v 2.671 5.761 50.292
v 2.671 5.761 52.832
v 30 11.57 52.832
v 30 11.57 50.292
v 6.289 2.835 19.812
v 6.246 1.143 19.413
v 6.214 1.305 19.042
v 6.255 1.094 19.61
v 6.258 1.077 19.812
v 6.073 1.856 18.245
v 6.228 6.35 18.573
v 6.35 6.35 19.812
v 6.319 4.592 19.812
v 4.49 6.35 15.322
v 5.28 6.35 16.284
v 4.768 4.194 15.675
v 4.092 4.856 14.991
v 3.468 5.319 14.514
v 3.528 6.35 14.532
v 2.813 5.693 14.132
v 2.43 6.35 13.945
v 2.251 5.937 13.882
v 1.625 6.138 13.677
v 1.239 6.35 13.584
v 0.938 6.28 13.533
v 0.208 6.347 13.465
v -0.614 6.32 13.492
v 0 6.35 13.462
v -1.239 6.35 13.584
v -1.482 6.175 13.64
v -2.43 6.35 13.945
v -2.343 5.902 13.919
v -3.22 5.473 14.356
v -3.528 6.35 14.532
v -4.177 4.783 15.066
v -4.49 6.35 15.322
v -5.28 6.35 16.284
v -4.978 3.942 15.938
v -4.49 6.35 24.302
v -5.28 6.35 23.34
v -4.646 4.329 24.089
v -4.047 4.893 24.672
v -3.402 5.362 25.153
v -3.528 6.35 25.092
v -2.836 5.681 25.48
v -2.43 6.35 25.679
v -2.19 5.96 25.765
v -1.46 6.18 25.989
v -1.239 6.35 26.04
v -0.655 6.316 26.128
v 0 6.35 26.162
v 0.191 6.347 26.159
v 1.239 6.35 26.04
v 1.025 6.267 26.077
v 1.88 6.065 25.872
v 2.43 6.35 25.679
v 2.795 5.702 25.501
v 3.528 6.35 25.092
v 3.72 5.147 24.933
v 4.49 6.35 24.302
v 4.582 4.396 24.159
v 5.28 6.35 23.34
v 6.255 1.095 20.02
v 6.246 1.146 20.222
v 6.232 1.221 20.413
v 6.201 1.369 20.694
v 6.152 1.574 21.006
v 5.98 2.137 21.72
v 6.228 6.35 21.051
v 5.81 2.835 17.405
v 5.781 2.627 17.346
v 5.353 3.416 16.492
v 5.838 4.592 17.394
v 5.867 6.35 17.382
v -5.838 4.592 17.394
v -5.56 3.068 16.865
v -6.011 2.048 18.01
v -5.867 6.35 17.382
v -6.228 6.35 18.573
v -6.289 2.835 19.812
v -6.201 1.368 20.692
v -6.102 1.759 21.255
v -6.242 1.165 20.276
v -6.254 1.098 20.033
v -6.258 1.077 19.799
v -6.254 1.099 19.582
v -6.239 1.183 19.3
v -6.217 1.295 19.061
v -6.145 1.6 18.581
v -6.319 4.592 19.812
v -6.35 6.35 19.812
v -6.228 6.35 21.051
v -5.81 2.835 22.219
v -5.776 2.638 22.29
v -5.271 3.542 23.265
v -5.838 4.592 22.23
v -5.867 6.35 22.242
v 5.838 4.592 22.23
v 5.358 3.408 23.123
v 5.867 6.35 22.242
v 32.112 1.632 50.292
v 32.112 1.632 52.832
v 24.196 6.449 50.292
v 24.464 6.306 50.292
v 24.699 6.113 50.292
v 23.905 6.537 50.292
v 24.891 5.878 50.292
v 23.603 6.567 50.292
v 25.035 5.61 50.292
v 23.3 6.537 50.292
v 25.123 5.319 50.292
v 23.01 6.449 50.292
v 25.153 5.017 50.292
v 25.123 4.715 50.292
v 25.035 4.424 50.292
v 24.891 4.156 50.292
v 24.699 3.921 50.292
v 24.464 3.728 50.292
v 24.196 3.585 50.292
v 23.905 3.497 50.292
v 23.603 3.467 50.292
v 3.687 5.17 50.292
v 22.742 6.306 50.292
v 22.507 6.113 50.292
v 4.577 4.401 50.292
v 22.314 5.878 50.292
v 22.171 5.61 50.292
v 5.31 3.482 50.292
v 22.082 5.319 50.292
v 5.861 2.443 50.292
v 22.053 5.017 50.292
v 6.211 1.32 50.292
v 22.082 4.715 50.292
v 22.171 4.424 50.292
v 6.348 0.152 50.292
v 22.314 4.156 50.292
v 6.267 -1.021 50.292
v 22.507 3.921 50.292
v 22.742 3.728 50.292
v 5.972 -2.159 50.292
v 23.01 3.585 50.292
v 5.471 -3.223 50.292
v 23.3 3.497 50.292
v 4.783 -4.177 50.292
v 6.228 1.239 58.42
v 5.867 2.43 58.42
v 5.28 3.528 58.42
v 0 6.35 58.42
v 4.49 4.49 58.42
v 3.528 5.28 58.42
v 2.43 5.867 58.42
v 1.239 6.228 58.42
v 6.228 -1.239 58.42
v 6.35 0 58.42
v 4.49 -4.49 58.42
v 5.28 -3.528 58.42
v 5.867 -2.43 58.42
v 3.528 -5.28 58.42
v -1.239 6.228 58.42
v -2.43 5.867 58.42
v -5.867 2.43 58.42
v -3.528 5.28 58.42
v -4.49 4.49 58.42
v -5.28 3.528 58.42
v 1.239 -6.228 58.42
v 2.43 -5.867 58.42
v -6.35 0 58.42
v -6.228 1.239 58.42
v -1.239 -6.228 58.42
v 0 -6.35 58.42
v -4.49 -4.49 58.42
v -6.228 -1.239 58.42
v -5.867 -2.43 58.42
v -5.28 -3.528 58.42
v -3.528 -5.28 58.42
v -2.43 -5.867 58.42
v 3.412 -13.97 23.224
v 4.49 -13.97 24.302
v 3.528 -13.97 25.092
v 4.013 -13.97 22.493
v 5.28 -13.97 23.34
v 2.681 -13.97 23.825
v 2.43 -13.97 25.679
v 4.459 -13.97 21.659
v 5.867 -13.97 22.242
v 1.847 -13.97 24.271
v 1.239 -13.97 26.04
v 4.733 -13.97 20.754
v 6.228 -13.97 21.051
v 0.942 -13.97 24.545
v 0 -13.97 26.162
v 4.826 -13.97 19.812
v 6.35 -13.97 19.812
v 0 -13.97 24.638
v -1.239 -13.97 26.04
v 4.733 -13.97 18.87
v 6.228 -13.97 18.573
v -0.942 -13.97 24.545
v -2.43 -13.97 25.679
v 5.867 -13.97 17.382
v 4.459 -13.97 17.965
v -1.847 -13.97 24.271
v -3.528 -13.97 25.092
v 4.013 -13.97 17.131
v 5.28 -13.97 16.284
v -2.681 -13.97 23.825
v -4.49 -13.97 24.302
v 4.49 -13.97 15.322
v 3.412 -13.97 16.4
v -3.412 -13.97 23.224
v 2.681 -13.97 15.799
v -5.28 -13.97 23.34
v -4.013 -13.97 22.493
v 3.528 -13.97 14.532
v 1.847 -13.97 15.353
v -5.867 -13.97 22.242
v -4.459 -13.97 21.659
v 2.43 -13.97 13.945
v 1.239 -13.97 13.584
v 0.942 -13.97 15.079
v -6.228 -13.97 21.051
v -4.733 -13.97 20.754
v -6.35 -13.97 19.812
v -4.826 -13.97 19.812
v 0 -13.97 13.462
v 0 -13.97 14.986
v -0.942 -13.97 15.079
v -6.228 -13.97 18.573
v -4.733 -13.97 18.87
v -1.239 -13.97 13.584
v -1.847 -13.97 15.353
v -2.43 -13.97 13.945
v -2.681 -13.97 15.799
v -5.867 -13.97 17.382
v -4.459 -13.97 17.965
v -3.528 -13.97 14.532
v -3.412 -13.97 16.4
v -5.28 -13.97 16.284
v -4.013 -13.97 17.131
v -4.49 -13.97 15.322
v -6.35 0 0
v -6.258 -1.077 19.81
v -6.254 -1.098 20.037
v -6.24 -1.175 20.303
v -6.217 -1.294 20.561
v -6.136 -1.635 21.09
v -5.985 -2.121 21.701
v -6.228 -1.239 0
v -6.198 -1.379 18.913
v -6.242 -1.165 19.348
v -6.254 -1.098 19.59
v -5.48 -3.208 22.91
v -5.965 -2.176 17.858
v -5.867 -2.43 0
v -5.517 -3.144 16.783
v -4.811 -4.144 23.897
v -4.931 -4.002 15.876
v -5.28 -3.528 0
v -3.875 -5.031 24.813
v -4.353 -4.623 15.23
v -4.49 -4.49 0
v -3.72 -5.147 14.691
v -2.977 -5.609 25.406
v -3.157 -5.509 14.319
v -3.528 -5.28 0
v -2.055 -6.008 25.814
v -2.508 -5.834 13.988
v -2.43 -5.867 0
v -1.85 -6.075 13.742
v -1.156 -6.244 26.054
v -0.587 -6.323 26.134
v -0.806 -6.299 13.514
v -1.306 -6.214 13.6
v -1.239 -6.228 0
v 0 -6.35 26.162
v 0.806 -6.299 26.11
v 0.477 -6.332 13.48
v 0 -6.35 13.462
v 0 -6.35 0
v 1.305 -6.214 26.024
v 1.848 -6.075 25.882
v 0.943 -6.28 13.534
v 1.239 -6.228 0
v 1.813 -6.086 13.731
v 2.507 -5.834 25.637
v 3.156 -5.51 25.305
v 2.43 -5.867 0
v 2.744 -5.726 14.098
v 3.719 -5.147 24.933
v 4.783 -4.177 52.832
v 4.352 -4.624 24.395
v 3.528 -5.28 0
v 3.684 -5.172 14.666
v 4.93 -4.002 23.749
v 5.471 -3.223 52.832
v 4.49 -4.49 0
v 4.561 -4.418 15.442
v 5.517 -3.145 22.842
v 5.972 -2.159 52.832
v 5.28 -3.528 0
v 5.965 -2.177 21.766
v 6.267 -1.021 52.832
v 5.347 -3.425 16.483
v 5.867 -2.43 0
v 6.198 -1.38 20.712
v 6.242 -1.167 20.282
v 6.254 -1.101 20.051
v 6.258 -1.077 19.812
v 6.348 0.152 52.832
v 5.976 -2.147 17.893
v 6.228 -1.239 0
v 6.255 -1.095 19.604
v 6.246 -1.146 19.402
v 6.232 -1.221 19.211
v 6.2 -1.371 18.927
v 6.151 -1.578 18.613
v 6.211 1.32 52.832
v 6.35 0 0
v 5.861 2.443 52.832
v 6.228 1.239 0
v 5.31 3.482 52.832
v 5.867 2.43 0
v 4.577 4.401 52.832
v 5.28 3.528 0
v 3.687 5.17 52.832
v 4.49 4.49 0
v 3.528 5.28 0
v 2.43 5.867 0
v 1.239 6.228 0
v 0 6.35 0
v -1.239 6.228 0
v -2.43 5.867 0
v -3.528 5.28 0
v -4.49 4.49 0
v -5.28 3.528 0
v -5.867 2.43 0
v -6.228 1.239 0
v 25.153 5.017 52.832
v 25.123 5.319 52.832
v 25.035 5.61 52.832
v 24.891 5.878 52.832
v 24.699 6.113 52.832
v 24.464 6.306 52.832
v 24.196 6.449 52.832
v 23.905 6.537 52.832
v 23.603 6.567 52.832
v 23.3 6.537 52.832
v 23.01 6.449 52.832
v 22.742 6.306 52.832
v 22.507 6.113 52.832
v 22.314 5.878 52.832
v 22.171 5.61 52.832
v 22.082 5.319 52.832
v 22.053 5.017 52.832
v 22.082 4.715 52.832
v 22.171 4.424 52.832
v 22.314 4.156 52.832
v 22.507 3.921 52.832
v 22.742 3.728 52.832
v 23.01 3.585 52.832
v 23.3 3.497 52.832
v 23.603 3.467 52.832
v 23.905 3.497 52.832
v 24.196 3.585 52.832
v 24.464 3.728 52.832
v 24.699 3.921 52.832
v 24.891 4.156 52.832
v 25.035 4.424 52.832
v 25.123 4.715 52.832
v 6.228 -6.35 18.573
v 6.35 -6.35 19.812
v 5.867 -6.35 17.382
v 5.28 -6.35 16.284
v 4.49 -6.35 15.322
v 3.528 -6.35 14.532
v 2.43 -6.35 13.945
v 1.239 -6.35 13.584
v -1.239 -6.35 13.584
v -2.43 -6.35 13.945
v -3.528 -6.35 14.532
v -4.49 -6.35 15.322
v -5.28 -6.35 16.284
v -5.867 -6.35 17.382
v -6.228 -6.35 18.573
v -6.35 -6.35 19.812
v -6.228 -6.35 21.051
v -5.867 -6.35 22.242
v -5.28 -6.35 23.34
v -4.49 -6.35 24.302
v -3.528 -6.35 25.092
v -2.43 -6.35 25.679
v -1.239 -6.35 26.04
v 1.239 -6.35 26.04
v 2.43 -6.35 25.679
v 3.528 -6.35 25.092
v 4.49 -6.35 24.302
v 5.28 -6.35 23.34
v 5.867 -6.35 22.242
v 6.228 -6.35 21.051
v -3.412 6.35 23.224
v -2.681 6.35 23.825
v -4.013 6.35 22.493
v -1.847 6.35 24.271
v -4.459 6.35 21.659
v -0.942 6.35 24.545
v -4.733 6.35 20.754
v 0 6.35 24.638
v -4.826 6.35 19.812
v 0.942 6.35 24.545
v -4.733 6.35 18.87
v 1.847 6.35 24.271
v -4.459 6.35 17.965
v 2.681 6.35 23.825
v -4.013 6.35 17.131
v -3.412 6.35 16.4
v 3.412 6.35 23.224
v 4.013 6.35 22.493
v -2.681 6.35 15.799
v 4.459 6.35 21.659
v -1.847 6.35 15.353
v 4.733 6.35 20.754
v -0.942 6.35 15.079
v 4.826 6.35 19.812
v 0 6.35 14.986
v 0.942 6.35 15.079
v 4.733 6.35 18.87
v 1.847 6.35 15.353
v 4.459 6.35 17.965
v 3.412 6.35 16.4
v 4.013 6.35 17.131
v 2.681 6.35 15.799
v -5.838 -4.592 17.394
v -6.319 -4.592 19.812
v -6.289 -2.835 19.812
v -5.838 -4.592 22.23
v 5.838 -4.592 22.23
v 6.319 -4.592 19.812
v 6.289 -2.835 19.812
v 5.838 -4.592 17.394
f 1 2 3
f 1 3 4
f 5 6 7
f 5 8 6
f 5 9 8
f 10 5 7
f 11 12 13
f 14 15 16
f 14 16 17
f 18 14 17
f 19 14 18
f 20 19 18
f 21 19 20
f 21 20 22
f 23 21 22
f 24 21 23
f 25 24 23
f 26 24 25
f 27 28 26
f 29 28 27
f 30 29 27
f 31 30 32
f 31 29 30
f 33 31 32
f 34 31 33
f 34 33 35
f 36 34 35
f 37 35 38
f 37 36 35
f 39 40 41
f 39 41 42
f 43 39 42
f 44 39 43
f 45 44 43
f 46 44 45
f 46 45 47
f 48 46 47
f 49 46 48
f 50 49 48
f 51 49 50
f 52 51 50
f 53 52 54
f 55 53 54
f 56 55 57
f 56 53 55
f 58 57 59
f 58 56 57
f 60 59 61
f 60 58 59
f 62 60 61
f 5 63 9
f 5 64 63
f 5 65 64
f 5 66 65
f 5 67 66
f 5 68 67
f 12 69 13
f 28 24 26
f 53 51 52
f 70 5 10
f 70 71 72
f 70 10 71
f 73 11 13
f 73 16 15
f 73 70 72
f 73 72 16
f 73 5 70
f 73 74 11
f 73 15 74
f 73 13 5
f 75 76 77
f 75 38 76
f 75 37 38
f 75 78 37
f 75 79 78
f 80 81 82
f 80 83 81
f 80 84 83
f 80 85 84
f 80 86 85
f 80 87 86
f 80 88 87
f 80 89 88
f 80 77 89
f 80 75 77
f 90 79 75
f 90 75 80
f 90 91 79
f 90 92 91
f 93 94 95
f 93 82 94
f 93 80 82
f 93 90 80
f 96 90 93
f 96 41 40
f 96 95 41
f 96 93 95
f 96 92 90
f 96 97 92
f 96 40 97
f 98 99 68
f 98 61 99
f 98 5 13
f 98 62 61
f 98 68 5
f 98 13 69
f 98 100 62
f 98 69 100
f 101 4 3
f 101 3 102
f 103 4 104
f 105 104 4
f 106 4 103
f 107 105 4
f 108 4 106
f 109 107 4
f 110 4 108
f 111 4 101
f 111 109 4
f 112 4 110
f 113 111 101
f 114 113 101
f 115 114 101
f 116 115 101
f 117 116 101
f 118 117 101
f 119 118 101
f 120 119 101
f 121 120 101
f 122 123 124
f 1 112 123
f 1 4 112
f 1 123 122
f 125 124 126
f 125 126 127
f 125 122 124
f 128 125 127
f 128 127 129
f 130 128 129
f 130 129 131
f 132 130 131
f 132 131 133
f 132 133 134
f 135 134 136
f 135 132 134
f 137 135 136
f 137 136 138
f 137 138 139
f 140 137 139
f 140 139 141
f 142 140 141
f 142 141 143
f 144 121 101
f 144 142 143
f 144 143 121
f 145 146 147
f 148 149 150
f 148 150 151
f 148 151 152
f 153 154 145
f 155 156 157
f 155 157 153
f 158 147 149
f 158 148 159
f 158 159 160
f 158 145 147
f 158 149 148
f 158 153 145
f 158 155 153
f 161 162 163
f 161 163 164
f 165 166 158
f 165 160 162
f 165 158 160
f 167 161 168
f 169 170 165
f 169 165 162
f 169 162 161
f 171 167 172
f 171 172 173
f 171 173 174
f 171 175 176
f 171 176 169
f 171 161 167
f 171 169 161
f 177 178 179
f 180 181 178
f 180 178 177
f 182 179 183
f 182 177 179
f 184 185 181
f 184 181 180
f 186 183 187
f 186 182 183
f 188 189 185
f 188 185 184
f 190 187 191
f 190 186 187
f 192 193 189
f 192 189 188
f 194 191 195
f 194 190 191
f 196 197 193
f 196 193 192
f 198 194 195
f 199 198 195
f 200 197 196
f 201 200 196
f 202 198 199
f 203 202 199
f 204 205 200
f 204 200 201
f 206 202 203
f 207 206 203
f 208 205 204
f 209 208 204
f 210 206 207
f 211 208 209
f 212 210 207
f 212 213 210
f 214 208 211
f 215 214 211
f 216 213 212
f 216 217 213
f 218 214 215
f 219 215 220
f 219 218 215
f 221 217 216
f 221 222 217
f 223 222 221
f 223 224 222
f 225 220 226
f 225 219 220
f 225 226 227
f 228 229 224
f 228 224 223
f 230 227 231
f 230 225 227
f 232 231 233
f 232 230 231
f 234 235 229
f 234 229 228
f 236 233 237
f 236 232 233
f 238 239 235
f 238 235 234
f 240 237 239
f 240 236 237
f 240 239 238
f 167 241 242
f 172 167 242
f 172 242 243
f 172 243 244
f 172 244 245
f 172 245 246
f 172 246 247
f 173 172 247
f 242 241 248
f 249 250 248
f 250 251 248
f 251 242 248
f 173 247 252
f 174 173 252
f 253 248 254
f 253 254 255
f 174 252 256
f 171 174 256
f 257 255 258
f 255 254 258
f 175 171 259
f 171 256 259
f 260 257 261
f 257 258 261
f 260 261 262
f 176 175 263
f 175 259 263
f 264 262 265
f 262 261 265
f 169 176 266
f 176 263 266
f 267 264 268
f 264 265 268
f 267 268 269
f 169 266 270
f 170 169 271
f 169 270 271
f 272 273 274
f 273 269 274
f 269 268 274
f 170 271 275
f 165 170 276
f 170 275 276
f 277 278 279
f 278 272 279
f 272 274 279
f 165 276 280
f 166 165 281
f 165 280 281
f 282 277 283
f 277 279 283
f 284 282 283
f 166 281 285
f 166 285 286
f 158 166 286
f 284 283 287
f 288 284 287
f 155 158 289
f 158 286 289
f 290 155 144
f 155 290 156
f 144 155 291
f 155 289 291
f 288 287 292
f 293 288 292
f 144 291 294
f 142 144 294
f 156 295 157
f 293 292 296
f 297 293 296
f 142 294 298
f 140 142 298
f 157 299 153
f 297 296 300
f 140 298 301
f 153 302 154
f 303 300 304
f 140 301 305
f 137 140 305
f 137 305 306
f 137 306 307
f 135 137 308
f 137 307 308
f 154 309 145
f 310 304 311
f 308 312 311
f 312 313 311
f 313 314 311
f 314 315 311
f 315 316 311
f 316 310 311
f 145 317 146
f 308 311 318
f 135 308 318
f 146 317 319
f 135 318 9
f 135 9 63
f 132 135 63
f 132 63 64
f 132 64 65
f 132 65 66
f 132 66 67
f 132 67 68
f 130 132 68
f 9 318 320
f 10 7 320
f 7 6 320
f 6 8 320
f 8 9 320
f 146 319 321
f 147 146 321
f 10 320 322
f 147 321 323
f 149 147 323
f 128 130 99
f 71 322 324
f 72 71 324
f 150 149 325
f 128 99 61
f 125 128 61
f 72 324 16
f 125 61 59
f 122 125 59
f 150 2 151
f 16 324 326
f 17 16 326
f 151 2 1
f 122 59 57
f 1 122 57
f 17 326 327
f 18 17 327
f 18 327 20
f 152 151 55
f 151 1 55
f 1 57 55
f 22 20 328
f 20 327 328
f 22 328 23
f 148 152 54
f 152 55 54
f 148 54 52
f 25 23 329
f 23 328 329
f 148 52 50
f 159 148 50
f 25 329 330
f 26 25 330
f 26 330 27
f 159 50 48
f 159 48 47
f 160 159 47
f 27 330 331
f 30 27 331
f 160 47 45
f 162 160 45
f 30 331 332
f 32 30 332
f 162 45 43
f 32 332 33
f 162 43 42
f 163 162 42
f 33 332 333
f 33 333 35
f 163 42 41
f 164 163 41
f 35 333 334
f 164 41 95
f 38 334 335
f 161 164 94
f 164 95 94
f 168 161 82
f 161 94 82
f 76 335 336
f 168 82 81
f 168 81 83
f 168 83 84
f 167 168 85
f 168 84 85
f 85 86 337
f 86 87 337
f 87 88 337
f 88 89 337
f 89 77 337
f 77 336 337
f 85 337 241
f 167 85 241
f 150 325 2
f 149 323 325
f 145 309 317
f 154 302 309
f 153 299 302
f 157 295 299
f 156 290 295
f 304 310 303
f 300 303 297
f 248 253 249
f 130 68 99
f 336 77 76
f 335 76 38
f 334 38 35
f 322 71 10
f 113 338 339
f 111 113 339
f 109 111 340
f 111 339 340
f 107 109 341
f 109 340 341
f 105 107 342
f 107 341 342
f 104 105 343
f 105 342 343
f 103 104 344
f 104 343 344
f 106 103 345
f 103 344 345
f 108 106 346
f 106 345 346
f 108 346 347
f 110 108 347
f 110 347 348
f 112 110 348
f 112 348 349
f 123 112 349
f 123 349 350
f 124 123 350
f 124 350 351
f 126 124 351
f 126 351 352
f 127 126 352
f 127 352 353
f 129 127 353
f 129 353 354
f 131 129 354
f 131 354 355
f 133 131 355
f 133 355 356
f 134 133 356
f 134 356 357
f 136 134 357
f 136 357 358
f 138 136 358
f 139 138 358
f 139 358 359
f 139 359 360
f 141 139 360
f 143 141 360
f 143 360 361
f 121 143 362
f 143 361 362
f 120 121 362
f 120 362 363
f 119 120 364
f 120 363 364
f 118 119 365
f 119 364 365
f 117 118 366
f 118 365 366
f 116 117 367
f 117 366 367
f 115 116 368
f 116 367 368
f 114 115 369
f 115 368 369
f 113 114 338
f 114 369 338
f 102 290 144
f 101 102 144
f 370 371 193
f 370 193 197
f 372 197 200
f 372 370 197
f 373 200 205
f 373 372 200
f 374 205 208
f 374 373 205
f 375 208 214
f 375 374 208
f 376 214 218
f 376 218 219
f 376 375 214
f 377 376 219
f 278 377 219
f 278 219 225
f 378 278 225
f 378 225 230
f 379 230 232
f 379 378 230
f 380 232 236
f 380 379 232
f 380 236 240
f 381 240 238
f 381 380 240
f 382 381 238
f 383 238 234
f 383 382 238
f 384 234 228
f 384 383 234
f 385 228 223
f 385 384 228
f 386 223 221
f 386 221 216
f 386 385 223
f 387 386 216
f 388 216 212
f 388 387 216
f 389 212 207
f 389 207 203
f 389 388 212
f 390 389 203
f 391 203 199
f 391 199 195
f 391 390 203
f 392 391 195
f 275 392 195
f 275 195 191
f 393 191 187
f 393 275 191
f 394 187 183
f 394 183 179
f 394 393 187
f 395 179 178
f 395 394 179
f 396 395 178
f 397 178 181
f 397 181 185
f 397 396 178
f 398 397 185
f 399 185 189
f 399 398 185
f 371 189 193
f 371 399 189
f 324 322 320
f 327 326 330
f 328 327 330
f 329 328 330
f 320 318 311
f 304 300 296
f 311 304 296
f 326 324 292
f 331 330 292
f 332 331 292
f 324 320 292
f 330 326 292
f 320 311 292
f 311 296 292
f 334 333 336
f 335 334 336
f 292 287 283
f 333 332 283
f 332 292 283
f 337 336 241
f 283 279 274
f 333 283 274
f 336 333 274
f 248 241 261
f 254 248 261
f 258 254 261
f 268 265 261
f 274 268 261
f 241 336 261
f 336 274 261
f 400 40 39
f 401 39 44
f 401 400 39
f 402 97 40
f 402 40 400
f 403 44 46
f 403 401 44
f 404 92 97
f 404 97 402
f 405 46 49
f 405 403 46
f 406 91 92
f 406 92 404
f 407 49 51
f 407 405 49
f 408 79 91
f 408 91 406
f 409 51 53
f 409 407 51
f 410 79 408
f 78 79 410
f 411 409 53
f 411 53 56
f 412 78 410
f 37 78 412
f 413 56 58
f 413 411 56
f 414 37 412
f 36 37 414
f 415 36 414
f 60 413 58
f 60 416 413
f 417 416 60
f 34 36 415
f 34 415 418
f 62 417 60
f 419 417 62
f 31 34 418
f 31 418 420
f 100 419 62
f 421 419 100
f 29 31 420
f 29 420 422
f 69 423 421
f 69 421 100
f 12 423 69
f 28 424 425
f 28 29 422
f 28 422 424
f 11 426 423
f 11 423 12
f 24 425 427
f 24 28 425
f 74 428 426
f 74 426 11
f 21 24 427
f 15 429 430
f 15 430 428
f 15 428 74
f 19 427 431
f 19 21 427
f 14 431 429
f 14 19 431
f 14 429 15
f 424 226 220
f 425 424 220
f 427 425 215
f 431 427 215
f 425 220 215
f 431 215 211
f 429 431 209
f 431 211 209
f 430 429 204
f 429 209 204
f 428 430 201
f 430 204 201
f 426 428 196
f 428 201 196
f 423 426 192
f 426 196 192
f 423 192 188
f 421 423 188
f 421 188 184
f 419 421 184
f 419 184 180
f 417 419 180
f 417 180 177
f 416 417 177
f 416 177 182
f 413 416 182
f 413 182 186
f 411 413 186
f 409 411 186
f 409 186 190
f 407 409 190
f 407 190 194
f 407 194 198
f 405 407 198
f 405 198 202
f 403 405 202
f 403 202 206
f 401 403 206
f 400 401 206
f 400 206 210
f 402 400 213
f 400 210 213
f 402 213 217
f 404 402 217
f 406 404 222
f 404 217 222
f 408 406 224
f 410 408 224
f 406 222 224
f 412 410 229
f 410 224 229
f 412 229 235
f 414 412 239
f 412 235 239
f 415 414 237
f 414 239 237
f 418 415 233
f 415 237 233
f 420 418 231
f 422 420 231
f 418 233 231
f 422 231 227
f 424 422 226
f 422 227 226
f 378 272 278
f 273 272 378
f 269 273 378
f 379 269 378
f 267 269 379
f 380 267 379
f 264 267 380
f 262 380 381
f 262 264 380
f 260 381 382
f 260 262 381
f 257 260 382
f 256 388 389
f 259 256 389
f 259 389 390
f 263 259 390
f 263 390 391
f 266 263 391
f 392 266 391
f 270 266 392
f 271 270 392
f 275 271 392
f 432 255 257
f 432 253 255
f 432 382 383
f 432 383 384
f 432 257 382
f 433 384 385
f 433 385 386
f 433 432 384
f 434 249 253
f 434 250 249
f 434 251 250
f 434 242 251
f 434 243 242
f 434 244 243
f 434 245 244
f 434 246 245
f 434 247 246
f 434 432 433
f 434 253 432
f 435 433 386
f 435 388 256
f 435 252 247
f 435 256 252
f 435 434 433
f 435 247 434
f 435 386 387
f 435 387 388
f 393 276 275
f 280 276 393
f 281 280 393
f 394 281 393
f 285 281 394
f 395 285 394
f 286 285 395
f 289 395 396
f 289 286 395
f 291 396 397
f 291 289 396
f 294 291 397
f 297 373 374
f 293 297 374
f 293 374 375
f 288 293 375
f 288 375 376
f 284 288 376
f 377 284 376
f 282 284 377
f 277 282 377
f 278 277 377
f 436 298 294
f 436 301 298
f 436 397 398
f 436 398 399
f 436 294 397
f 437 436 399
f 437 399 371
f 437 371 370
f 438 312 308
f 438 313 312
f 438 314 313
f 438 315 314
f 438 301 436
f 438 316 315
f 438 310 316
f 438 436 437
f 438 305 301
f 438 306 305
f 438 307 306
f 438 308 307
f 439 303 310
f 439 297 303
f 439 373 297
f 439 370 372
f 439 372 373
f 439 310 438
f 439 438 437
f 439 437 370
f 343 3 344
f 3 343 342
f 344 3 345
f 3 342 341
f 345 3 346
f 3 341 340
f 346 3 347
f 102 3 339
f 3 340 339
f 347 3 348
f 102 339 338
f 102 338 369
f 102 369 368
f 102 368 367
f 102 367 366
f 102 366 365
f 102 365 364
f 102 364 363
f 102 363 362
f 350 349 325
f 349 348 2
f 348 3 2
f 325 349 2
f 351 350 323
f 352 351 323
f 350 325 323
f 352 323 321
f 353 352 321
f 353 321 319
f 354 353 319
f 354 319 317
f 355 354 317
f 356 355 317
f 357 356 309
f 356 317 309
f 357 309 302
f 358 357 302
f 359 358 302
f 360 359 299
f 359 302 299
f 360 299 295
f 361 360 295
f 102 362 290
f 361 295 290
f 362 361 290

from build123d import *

# Parameters (mm, degrees)
SKETCH1_R           = 6.35
BOSS_EXTRUDE1_DEPTH = 58.42
BOSS_EXTRUDE3_START = -2.54
SKETCH7_W           = 10.16
SKETCH7_H           = 2.54
BOSS_EXTRUDE3_DEPTH = 27.94
SKETCH10_R          = 1.55
CUT_EXTRUDE2_DEPTH  = 64.384429767
SKETCH13_R          = 4.826
CUT_EXTRUDE3_DEPTH  = 72.389091006


# Read off the part's stored shape, not the designer's step: Boss-Extrude2, Boss-Extrude4
with BuildPart() as part:
    # Sketch1 → Boss-Extrude1 (new body)
    with BuildSketch(Plane.XY):
        with Locations(Location((0, 0, 0), (0, 0, 180))):
            Circle(SKETCH1_R)
    extrude(amount=BOSS_EXTRUDE1_DEPTH)

    # Boss-Extrude2 outline → Boss-Extrude2 (revolve)
    with BuildSketch(Plane.XY.offset(19.812)):
        Polygon((6.35, -13.97), (6.35, -6.35), (6.257921095, -1.074803042), (0, -1.074803042), (0, -13.97), align=None)
    revolve(axis=Axis((0, 0, 19.812), (0, 1, 0)))

    # Sketch7 → Boss-Extrude3 (add)
    with BuildSketch(Plane(origin=(6.211237265, 1.320239237, 0), x_dir=(0.20791169081776328, -0.9781476007338049, 0), z_dir=(0.9781476007338049, 0.20791169081776328, 0)).offset(BOSS_EXTRUDE3_START)):
        with Locations((0, -51.562)):
            Rectangle(SKETCH7_W, SKETCH7_H)
    extrude(amount=BOSS_EXTRUDE3_DEPTH)

    # Sketch10 → Cut-Extrude2 (cut, through all)
    with BuildSketch(Plane.XY.offset(52.832)):
        with Locations((23.602701606, 5.016909099)):
            Circle(SKETCH10_R)
    extrude(amount=-CUT_EXTRUDE2_DEPTH, mode=Mode.SUBTRACT)

    # Boss-Extrude4 outline → Boss-Extrude4 (revolve)
    with BuildSketch(Plane.XY.offset(19.812)):
        Polygon((0, 6.350021501), (0, 1.075341111), (6.257930487, 1.075341111), (6.350000375, 6.350021501), align=None)
    revolve(axis=Axis((0, 0, 19.812), (0, 1, 0)))

    # Sketch13 → Cut-Extrude3 (cut, through all)
    with BuildSketch(Plane.XZ.offset(13.97)):
        with Locations(Location((0, 19.812, 0), (0, 0, 270))):
            Circle(SKETCH13_R)
    extrude(amount=-CUT_EXTRUDE3_DEPTH, mode=Mode.SUBTRACT)


solid = part.part
